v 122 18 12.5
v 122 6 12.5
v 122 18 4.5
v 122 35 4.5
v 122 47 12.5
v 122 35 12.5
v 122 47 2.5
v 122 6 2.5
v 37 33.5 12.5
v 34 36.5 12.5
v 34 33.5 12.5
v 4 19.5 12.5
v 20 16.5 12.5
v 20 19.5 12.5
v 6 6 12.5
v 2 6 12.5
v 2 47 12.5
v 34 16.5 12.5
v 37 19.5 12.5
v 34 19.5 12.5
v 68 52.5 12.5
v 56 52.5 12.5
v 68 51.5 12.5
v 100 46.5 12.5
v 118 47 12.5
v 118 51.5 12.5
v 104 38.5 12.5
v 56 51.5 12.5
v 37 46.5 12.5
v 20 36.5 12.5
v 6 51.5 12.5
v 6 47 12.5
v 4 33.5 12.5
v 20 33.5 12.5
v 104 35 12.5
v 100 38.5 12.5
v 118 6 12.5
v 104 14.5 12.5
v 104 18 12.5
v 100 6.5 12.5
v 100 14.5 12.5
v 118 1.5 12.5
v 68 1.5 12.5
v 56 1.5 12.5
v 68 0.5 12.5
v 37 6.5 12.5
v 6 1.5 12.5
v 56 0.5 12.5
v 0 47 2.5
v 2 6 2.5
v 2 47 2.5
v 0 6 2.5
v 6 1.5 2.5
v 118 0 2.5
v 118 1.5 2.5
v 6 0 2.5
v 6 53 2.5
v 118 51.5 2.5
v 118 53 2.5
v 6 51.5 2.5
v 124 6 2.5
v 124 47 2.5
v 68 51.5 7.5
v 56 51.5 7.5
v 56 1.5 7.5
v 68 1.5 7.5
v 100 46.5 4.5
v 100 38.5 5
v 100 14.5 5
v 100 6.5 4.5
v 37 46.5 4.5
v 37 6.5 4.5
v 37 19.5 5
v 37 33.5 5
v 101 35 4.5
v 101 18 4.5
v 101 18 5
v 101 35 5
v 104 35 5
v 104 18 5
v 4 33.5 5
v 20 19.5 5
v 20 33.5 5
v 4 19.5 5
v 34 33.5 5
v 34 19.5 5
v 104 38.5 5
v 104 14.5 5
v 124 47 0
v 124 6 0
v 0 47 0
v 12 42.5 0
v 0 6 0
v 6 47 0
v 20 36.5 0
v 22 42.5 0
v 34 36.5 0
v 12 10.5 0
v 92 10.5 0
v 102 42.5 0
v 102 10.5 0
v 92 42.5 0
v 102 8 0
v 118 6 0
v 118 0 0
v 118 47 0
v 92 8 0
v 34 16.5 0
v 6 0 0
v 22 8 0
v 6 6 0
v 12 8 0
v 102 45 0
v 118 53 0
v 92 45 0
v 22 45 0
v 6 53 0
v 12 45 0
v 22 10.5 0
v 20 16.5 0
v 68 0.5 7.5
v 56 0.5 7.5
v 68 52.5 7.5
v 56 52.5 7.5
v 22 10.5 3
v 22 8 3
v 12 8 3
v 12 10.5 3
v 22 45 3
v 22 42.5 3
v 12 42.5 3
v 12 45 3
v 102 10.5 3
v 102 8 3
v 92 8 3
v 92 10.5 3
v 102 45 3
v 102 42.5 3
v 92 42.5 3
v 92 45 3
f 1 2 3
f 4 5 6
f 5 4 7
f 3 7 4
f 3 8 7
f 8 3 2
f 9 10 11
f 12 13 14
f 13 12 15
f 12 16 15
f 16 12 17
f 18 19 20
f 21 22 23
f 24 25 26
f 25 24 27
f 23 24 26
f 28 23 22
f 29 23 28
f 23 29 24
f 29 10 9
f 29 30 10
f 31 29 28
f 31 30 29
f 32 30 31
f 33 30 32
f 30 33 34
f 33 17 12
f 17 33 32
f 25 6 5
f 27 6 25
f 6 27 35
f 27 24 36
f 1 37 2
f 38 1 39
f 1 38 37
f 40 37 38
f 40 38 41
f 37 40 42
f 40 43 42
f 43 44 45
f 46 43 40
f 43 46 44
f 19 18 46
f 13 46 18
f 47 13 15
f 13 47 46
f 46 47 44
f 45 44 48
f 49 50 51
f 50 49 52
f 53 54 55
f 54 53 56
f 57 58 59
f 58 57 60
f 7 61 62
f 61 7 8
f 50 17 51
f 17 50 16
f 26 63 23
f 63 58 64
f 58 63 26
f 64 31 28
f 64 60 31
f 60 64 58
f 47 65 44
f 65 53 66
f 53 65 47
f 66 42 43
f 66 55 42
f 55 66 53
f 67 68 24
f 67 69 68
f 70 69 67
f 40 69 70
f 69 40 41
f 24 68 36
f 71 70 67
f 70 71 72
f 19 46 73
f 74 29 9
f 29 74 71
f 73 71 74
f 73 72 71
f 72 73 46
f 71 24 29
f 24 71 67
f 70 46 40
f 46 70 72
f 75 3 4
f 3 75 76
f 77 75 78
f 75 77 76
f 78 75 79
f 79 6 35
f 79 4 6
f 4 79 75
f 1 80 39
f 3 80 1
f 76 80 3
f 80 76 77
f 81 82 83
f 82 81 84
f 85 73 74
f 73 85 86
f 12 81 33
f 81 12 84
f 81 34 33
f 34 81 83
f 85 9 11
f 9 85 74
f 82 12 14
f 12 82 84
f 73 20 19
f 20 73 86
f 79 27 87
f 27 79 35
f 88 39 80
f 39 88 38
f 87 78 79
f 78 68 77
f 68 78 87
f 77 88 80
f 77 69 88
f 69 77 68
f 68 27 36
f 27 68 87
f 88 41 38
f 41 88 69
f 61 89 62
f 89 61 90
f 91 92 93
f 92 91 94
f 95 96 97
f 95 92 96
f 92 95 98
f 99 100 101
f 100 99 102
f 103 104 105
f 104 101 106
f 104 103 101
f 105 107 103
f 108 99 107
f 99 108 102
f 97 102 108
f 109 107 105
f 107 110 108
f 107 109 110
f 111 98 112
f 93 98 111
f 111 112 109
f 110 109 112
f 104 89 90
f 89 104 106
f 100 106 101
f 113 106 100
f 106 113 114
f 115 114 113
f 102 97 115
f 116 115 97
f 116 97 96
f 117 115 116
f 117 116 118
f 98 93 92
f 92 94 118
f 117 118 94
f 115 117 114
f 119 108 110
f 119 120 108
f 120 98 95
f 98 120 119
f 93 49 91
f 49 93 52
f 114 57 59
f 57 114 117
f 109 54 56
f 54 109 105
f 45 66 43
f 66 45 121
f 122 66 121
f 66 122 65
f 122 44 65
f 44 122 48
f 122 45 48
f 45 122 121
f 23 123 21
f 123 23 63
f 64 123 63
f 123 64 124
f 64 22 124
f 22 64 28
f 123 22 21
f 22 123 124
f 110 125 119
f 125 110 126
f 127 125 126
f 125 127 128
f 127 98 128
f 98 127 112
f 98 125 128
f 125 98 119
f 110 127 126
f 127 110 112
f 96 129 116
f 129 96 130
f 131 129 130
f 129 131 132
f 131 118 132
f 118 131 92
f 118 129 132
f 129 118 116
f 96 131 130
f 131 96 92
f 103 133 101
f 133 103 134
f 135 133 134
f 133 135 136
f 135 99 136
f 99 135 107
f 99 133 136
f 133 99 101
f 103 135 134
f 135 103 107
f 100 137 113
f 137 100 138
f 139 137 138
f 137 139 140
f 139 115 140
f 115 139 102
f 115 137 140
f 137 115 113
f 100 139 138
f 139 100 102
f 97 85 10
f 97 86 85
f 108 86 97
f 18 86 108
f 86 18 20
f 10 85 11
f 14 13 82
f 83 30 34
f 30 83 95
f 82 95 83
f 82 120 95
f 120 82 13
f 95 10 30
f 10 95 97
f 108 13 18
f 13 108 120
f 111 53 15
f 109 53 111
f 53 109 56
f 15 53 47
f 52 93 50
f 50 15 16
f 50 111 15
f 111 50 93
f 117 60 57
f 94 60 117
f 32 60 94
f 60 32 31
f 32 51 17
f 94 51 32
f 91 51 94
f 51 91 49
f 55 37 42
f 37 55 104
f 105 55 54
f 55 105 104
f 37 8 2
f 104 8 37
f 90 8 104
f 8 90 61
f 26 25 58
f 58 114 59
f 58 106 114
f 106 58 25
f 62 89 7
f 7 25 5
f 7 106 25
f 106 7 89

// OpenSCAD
// file: ../../00_common/screw_bosses.scad
// =============================================================================
// OpenMotorBridge - Screw Bosses & Fastener Primitives
// =============================================================================
// File: hardware/cad/scad/00_common/screw_bosses.scad
// Description: Reusable parametric modules for screw standoffs, corner clamping
//              posts, and mounting ears.
// =============================================================================

include <parameters.scad>;

// 1. Cylindrical Screw Standoff Boss (with center hole)
module screw_boss(outer_r=2.5, inner_r=1.2, h=5.0) {
    difference() {
        cylinder(r=outer_r, h=h, center=false);
        translate([0, 0, -0.1])
            cylinder(r=inner_r, h=h + 0.2, center=false);
    }
}

// 2. Rectangular Corner Clamping Post (with center screw hole)
module corner_screw_post(size_x=5.0, size_y=5.0, h=12.0, hole_r=1.65, hole_h=10.0, hole_offset_z=2.0) {
    difference() {
        cube(size=[size_x, size_y, h], center=false);
        translate([size_x/2.0, size_y/2.0, hole_offset_z])
            cylinder(r=hole_r, h=hole_h + 0.1, center=false);
    }
}

// 3. M4 Silentblock Outer Mounting Ear (Centered in Y around y=0, extends along +X)
module mounting_ear_m4(ear_len=14.0, ear_w=12.0, ear_h=5.0, hole_r=2.2) {
    difference() {
        union() {
            translate([0, -ear_w/2.0, 0])
                cube(size=[ear_len - ear_w/2.0, ear_w, ear_h], center=false);
            translate([ear_len - ear_w/2.0, 0, 0])
                cylinder(r=ear_w/2.0, h=ear_h, center=false);
        }
        translate([ear_len - ear_w/2.0, 0, -0.1])
            cylinder(r=hole_r, h=ear_h + 0.2, center=false);
    }
}

// 4. Captive Hex Nut Pocket (DIN 934 / DIN 985 with center screw through-hole)
module hex_nut_pocket(sw=NUT_M4_SW, h=NUT_M4_H, screw_r=M4_SCREW_HOLE_R, through_h=10.0) {
    // Hexagonal pocket (flat-to-flat SW converted to circle radius: r = sw / sqrt(3))
    hex_r = sw / sqrt(3);
    union() {
        // Hexagonal nut pocket
        cylinder(r=hex_r, h=h, center=false, $fn=6);
        // Screw clearance through-hole
        translate([0, 0, -through_h/2.0])
            cylinder(r=screw_r, h=through_h + h, center=false, $fn=30);
    }
}
// main file
// =============================================================================
// OpenMotorBridge - Satellite Pod: OMM 2.4 GHz UCS Modular Insert (Deckel / Nest)
// =============================================================================
// File: hardware/cad/scad/03_pod_cartridges/parts/06_insert_omm_ucs.scad
// Description: Standalone 3D printable top cradle insert for OpenMotorMesh (OMM)
//              2.4 GHz OEM module in standardized UCS (Universal Communication
//              Solution) form factor.
//              Features:
//              - Form-fitting UCS module cradle nest (68 x 38 x 8 mm, R = 3.0 mm)
//              - Front USB-C access port (9.5 x 3.5 mm) for standalone charging & flashing
//              - Through-deck pass-through for 2-wire DC harness to PCBA 03 below
//              - Internal bay for 600 mAh LiPo flat cell (40 x 26 x 5 mm)
//              - Convective breathing slots for thermal dissipation
//              - Open corner cutouts giving 100% vertical screwdriver access to M2 screws
//              - Integrated outward-facing EPDM rubber strap retention hooks
// =============================================================================

include <../../00_common/parameters.scad>;
include <../../00_common/screw_bosses.scad>;

module cartridge_insert_omm_ucs(
    insert_l = CARTRIDGE_BASE_L - 6.0, // 124.0 mm for CARTRIDGE_BASE_L = 130.0
    insert_w = 53.0,
    deck_th  = 2.5,
    cradle_h = 10.0
) {
    difference() {
        union() {
            // 1. Intermediate Partition Deck (Grundplatte at z = 0 .. deck_th)
            cube(size=[insert_l, insert_w, deck_th], center=false);

            // 2. UCS Cradle 3D Contour Body (z = deck_th .. deck_th + cradle_h)
            translate([2.0, 1.5, deck_th]) {
                difference() {
                    cube(size=[insert_l - 4.0, insert_w - 3.0, cradle_h], center=false);

                    // A. Universal UCS Module Recessed Contour Bed (68 x 38 mm module placed serially behind PCBA 03)
                    translate([35.0, (insert_w - 3.0 - 40.0)/2.0, 2.0])
                        cube(size=[63.0, 40.0, cradle_h + 0.1], center=false);

                    // B. Dedicated 5V COTS Bi-Directional RF Booster Pocket (25 x 15 mm module at rear)
                    translate([99.0, (insert_w - 3.0 - 17.0)/2.0, 2.0])
                        cube(size=[24.0, 17.0, cradle_h + 0.1], center=false);

                    // C. Coaxial Cable (Twin-SMA 2.4G & 446M) & USB-C Interconnect Channels
                    translate([2.0, (insert_w - 3.0 - 14.0)/2.0, 2.5])
                        cube(size=[34.0, 14.0, cradle_h + 0.1], center=false);
                    translate([96.0, (insert_w - 3.0 - 24.0)/2.0, 2.5])
                        cube(size=[6.0, 24.0, cradle_h + 0.1], center=false);
                }
            }

            // 3. Outward-Facing Rubber Strap Overhang Ledges (Top Lip at z = deck_th + 5.0 .. deck_th + cradle_h)
            // Left Flank Top Lip
            translate([insert_l/2.0 - 6.0, 0.5, deck_th + 5.0])
                cube(size=[12.0, 2.5, cradle_h - 5.0], center=false);
            // Right Flank Top Lip
            translate([insert_l/2.0 - 6.0, insert_w - 3.0, deck_th + 5.0])
                cube(size=[12.0, 2.5, cradle_h - 5.0], center=false);
        }

        // 4. True Through-Deck Contact & Wiring Pass-Through (Cuts through Grundplatte)
        // Pass-through to PCBA 03 J_AUDIO_PWR / J_ACT headers below
        translate([20.0, insert_w/2.0 - 10.0, -1.0])
            cube(size=[14.0, 20.0, deck_th + cradle_h + 2.0], center=false);

        // 5. 4x Sled M2 Corner Fastening Screws Clearances (Ø 4.5 mm counterbore & tool access)
        translate([3.5, 3.5, -0.5])
            cylinder(r=2.2, h=deck_th + cradle_h + 1.0, center=false, $fn=24);
        translate([insert_l - 3.5, 3.5, -0.5])
            cylinder(r=2.2, h=deck_th + cradle_h + 1.0, center=false, $fn=24);
        translate([3.5, insert_w - 3.5, -0.5])
            cylinder(r=2.2, h=deck_th + cradle_h + 1.0, center=false, $fn=24);
        translate([insert_l - 3.5, insert_w - 3.5, -0.5])
            cylinder(r=2.2, h=deck_th + cradle_h + 1.0, center=false, $fn=24);

        // 6. 4x Convective Airflow & Breathing Slots
        for (sx = [12.0, 92.0]) {
            translate([sx, 8.0, -0.5])
                cube(size=[10.0, 2.5, deck_th + 1.0], center=false);
            translate([sx, insert_w - 10.5, -0.5])
                cube(size=[10.0, 2.5, deck_th + 1.0], center=false);
        }

        // 7. Corner Post Chamfers
        translate([-1.0, -1.0, -0.5])
            cube(size=[7.0, 7.0, deck_th + cradle_h + 1.0], center=false);
        translate([-1.0, insert_w - 6.0, -0.5])
            cube(size=[7.0, 7.0, deck_th + cradle_h + 1.0], center=false);
        translate([insert_l - 6.0, -1.0, -0.5])
            cube(size=[7.0, 7.0, deck_th + cradle_h + 1.0], center=false);
        translate([insert_l - 6.0, insert_w - 6.0, -0.5])
            cube(size=[7.0, 7.0, deck_th + cradle_h + 1.0], center=false);
    }
}

// Preview standalone
cartridge_insert_omm_ucs();
